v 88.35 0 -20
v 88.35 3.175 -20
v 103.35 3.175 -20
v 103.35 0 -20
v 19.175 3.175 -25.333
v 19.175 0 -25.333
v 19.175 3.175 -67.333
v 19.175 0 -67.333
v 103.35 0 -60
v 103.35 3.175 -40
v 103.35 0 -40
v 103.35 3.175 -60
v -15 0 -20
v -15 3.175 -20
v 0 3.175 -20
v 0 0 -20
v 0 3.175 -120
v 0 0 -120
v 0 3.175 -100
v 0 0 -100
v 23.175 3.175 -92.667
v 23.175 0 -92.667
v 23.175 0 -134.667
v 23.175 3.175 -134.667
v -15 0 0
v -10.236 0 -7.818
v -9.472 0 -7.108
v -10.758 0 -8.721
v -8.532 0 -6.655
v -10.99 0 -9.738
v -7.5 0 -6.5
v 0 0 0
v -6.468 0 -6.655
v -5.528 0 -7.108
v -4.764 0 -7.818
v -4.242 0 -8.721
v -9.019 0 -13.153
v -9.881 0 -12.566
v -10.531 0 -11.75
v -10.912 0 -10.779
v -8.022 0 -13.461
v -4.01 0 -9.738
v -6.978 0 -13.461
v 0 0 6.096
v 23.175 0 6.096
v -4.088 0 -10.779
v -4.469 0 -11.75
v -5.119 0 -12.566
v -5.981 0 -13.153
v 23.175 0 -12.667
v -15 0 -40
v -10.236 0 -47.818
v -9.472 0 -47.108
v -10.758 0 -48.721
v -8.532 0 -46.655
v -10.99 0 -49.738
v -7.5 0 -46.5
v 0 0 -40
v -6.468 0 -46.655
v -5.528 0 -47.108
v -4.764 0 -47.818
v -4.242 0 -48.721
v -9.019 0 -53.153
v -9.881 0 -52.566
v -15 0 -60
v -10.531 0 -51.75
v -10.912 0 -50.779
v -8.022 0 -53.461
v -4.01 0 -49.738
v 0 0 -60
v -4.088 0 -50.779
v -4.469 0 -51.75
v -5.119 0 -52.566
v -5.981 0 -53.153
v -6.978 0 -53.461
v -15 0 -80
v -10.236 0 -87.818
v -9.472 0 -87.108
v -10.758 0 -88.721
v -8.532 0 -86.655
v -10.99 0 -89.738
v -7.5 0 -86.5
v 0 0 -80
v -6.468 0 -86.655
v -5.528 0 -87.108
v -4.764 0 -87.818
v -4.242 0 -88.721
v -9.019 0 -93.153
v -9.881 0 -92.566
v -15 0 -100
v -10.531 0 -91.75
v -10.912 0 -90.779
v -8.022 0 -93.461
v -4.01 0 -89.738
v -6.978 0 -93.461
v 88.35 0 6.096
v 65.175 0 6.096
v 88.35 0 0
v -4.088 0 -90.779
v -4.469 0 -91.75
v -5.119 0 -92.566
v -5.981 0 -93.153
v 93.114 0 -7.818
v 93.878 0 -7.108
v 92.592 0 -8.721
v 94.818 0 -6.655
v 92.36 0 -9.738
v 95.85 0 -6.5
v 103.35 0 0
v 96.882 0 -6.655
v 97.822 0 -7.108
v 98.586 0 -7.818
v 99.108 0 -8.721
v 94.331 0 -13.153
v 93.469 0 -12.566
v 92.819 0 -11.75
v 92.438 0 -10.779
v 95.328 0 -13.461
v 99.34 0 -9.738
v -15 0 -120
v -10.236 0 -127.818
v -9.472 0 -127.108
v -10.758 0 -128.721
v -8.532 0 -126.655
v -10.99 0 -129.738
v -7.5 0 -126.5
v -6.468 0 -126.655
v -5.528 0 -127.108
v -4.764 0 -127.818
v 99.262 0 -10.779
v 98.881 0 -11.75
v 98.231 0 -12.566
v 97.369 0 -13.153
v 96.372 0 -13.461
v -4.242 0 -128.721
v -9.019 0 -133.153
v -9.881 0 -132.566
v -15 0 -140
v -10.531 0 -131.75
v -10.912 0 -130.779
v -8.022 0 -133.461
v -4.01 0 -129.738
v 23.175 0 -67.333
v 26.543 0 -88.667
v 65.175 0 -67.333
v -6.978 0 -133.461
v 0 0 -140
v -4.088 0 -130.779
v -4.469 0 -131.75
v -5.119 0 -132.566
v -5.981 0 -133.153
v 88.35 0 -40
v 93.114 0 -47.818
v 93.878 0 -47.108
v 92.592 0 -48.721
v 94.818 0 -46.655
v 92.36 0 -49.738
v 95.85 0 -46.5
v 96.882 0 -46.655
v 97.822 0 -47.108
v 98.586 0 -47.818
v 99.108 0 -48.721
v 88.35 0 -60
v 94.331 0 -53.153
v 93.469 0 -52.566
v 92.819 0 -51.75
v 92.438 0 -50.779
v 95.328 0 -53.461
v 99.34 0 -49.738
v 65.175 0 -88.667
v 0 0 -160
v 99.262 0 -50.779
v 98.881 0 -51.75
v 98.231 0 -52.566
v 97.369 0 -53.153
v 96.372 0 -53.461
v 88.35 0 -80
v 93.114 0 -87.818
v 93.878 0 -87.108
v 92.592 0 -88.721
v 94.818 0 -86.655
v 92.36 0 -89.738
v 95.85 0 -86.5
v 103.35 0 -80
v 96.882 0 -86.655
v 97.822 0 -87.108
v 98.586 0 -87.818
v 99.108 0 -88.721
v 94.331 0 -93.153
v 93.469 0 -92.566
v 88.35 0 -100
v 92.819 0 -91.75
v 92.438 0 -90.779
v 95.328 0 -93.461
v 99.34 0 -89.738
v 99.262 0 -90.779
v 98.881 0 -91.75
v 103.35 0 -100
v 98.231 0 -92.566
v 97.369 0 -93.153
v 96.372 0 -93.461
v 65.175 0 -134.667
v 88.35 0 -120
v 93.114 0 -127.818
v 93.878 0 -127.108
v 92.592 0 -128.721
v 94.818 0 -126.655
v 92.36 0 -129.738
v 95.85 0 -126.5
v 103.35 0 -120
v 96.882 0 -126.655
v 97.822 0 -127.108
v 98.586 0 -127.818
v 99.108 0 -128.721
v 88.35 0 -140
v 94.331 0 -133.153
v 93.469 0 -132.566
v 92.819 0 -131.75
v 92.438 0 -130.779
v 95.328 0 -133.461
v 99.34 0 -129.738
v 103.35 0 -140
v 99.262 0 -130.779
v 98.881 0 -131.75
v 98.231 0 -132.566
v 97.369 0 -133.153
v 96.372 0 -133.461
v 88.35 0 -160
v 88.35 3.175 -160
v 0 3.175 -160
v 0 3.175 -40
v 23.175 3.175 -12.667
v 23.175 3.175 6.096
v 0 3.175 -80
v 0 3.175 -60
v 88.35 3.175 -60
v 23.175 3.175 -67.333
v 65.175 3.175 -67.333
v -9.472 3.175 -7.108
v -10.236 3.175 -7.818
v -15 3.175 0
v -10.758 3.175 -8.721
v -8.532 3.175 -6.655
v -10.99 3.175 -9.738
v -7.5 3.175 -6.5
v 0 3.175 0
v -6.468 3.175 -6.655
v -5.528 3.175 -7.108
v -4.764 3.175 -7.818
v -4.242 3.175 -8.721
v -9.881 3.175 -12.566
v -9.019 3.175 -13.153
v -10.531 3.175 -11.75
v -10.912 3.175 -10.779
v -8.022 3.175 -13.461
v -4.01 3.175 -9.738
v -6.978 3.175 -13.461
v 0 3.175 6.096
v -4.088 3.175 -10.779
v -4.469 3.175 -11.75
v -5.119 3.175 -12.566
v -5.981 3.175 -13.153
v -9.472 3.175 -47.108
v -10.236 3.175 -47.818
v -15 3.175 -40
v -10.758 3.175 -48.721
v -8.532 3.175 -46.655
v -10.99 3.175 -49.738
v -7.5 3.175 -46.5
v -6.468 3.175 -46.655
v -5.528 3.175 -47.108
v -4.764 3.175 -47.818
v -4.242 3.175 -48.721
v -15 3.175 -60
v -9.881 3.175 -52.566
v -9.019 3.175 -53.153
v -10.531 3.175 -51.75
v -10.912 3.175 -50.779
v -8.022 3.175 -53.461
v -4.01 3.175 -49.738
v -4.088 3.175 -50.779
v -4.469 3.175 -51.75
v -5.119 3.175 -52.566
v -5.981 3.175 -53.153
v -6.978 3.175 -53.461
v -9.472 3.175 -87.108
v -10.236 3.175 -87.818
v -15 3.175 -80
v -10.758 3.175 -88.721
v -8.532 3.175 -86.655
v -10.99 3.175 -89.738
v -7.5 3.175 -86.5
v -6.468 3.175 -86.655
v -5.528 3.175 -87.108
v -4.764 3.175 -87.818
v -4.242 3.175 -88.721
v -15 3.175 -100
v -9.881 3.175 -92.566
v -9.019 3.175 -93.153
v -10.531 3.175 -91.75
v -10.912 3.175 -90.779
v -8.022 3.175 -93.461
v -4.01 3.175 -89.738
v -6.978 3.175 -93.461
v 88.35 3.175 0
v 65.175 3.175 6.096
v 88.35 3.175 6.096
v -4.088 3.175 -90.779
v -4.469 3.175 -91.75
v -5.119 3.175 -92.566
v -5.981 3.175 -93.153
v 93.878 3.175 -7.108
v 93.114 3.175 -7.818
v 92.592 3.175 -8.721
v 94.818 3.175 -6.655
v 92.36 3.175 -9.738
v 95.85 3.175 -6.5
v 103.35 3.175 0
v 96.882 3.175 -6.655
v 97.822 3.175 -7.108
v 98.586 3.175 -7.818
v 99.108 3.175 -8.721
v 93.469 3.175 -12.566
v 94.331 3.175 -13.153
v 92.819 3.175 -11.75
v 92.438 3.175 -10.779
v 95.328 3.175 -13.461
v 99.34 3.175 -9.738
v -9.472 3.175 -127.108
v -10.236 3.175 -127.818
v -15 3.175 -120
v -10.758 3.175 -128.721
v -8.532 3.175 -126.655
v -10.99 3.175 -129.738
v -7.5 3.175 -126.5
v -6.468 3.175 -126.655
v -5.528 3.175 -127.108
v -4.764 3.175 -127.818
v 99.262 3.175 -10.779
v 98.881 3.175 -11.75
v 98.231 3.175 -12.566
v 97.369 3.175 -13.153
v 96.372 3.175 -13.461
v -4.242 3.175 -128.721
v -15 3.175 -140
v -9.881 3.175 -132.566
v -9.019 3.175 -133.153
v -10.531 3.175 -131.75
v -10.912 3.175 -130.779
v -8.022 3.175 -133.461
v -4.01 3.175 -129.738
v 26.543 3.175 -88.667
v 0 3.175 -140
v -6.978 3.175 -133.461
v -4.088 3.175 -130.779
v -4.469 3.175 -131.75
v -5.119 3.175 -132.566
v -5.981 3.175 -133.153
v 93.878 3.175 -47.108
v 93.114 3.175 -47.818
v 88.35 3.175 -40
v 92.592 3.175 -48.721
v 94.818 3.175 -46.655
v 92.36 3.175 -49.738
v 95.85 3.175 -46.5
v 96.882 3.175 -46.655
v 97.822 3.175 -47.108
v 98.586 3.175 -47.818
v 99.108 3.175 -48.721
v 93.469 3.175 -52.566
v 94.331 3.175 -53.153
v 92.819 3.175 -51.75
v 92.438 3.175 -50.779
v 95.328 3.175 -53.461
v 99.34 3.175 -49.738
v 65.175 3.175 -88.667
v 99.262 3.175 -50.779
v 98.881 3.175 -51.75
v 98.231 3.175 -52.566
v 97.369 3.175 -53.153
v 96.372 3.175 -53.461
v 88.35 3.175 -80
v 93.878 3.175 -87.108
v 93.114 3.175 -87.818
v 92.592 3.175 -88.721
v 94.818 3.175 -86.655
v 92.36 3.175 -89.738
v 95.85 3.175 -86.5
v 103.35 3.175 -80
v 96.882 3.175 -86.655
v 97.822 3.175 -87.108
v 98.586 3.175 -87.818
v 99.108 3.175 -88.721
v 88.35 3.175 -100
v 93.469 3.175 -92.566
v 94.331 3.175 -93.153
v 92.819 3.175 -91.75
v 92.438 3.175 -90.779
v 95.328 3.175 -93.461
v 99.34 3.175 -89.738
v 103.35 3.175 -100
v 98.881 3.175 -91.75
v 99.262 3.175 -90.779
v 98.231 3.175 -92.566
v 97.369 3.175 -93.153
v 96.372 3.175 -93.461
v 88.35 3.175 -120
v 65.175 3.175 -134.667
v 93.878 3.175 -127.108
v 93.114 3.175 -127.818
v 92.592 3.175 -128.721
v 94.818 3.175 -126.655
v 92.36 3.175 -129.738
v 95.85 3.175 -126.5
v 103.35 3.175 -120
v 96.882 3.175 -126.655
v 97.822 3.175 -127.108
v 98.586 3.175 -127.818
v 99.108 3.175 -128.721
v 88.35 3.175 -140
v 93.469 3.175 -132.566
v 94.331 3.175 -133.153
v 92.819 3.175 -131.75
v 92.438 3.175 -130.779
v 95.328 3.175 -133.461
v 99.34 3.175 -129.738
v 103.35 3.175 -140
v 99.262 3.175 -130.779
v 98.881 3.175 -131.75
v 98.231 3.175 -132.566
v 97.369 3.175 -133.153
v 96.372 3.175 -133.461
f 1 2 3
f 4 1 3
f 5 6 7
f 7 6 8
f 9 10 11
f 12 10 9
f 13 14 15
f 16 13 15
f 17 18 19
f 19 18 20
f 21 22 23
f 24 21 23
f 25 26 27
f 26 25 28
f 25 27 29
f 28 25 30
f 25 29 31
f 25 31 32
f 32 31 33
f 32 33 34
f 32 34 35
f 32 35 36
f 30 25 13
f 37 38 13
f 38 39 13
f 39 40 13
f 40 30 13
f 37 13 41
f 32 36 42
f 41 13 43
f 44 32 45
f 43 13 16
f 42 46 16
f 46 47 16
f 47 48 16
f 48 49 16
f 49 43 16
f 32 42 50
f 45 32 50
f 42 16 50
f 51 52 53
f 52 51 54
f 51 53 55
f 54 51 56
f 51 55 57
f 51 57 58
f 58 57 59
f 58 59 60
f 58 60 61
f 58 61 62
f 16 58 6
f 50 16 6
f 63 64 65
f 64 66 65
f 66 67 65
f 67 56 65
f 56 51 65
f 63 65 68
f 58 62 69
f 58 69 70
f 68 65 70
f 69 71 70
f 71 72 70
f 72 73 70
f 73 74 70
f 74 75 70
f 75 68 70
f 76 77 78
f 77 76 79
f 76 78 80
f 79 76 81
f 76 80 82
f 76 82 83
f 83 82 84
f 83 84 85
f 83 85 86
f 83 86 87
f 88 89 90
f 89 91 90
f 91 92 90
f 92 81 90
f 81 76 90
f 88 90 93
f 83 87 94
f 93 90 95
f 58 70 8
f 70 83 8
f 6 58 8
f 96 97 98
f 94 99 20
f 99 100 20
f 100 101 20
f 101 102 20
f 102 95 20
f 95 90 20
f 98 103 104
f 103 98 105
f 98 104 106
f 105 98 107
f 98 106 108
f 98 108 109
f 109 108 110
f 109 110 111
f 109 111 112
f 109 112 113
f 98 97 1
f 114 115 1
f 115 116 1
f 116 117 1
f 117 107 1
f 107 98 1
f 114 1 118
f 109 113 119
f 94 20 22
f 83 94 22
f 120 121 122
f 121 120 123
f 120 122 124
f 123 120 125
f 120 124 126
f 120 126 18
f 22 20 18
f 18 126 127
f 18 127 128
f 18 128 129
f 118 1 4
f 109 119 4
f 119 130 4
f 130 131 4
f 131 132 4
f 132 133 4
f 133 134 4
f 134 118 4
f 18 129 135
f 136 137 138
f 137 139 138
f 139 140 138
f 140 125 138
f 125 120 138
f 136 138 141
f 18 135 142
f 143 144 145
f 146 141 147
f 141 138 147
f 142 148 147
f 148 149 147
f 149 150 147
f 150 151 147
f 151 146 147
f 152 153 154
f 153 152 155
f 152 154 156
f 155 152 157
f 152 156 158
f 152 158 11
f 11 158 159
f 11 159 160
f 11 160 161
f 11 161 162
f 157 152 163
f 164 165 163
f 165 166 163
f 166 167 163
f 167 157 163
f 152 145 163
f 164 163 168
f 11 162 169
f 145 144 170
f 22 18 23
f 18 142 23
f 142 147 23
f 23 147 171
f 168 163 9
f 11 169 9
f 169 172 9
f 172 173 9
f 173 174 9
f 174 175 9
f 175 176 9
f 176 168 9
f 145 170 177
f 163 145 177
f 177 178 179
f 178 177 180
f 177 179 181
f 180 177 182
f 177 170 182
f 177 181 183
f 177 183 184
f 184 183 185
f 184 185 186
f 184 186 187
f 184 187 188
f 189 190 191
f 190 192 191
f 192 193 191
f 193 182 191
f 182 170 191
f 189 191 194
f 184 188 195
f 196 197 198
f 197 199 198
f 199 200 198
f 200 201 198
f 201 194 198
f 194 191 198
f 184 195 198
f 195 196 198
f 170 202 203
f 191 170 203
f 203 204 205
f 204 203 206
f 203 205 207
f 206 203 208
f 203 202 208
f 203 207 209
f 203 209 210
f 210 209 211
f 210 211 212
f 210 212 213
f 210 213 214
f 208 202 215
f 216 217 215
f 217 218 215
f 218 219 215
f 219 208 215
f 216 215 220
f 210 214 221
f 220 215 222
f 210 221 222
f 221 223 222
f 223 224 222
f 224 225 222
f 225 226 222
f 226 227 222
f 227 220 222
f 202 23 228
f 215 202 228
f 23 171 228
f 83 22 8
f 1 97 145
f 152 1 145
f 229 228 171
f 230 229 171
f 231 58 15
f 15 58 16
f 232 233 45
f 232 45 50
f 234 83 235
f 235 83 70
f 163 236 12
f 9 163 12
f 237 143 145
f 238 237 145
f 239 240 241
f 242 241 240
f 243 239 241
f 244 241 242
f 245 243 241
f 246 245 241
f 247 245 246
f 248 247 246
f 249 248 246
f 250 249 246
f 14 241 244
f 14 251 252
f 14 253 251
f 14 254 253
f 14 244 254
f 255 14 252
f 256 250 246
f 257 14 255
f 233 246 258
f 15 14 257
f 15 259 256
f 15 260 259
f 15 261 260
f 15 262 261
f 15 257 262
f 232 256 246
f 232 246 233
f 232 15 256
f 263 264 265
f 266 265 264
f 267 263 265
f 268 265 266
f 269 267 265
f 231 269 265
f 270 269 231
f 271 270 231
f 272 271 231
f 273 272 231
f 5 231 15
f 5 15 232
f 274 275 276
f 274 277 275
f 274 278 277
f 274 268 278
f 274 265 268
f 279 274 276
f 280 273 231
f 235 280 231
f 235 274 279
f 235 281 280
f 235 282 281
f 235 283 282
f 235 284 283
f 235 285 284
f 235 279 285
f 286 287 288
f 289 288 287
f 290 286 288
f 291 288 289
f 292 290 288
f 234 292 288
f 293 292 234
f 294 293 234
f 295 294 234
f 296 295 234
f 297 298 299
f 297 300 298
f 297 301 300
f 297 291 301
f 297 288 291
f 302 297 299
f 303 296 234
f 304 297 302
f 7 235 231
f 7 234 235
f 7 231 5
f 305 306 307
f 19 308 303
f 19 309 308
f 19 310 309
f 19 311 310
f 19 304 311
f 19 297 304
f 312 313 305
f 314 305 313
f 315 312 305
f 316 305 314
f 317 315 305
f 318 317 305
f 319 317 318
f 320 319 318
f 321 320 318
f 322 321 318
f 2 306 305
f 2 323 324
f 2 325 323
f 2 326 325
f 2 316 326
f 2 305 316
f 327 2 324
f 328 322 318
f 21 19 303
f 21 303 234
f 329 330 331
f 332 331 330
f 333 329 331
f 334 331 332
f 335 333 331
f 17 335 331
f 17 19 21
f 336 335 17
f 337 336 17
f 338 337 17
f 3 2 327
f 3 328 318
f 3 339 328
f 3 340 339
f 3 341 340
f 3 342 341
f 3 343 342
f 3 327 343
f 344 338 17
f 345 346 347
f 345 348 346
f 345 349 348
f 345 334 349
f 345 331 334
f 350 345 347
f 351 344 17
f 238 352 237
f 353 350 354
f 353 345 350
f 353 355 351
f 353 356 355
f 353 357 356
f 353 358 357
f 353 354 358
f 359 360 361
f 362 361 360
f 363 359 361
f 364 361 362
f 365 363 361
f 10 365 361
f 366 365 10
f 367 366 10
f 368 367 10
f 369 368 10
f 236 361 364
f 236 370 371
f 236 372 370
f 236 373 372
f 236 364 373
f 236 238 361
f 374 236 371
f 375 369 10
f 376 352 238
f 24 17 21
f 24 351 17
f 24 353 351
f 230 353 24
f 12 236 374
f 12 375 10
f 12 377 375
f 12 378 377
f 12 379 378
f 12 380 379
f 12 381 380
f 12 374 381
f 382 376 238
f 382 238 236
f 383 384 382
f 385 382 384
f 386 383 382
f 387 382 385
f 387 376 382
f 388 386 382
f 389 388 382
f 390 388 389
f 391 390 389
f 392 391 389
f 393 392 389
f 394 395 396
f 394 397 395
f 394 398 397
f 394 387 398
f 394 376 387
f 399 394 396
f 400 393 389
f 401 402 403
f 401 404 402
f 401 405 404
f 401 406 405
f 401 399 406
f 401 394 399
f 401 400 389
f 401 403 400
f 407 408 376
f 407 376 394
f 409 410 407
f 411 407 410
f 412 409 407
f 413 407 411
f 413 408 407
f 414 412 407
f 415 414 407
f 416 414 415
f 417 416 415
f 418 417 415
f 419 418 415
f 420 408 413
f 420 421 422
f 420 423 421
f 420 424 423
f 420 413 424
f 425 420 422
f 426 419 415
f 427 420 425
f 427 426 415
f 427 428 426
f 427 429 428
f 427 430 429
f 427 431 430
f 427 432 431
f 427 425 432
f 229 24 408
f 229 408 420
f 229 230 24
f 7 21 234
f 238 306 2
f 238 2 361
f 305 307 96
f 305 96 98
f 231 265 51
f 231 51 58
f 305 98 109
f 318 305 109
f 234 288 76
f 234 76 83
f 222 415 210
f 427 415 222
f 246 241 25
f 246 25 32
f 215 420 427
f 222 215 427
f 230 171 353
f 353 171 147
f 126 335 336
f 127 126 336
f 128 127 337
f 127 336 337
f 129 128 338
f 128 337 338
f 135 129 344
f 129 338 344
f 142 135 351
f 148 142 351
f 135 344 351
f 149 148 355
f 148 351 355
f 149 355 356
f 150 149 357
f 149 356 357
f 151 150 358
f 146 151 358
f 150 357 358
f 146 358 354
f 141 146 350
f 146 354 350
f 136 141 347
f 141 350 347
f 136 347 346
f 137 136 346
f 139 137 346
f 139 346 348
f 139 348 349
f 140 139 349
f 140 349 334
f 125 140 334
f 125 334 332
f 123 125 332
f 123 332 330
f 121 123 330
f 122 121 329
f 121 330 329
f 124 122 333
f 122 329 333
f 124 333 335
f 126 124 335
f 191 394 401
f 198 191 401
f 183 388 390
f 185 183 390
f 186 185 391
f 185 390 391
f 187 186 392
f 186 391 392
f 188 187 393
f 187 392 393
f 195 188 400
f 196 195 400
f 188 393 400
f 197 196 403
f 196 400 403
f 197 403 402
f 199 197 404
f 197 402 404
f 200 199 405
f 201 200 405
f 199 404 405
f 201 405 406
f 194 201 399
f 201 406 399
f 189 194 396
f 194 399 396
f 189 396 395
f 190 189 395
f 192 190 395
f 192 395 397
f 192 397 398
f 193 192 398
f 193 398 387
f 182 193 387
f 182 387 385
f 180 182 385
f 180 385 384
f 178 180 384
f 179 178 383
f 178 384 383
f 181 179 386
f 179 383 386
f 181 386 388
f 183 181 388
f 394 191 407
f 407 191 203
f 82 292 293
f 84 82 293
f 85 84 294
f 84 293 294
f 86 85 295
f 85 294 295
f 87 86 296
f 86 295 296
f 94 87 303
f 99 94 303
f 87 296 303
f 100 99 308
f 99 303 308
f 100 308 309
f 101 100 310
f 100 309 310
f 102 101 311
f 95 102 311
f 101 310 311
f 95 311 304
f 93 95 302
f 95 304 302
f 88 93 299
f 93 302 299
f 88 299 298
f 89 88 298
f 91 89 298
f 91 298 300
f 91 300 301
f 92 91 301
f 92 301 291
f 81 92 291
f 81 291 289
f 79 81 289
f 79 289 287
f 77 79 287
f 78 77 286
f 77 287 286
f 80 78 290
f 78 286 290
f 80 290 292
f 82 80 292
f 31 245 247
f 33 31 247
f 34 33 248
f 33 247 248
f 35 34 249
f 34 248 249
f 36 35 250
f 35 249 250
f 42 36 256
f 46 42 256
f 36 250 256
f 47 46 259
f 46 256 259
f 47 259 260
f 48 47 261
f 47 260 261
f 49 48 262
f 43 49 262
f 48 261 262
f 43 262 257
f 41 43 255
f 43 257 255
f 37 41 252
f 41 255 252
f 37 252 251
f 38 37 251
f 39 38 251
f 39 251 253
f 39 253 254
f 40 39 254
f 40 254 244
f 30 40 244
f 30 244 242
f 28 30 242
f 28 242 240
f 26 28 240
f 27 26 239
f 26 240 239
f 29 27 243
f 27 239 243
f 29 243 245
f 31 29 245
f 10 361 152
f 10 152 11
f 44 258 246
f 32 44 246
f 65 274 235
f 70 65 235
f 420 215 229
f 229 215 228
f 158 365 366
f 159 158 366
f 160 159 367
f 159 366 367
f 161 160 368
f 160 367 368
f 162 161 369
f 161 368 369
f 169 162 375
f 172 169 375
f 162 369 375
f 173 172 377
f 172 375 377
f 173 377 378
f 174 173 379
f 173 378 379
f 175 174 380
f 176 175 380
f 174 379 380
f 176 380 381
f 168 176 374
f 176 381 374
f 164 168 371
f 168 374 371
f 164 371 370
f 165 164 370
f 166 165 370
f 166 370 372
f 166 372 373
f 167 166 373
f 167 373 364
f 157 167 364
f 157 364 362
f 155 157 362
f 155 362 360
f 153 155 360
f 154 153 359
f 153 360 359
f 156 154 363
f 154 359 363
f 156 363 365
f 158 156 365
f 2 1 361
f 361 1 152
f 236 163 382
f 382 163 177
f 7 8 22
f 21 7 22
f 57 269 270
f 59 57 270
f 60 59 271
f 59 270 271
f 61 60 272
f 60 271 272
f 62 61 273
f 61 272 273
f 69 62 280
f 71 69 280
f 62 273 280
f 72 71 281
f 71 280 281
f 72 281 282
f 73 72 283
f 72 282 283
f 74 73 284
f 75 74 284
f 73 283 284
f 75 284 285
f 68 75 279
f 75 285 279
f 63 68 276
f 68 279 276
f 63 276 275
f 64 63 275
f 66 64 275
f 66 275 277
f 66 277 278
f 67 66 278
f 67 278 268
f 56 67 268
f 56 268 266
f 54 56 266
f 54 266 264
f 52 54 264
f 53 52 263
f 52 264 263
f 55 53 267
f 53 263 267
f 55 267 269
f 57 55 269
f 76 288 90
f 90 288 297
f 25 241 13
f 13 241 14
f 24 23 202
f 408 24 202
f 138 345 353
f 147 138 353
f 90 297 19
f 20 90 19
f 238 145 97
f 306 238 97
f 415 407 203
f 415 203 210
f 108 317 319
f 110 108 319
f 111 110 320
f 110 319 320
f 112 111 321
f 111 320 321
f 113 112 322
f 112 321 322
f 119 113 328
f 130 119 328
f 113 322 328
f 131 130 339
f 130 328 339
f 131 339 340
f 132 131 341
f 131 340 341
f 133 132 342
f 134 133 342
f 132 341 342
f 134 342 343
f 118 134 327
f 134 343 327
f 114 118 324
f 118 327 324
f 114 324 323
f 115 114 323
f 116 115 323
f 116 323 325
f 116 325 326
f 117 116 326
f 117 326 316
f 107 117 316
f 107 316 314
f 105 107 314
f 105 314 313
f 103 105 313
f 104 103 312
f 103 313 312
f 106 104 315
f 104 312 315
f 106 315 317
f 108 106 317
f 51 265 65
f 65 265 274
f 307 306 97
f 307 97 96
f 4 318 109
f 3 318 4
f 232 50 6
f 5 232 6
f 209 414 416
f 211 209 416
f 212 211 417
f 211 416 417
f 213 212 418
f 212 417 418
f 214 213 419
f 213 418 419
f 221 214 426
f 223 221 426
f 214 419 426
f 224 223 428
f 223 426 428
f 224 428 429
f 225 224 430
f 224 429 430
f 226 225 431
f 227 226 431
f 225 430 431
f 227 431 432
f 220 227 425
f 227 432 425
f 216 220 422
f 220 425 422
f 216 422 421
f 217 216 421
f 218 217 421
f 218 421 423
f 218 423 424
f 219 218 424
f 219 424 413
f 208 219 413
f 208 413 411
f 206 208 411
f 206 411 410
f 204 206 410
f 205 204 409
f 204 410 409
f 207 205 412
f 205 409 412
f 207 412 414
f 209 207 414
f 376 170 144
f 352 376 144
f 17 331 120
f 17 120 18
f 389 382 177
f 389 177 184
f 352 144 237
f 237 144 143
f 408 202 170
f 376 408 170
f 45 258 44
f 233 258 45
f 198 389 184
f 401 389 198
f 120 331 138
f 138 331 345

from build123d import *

# Parameters (mm, degrees)
BOSS_EXTRUDE1_DEPTH = 3.175
SKETCH3_W           = 15
SKETCH3_H           = 20
SKETCH3_R           = 3.5
BOSS_EXTRUDE3_DEPTH = 3.175
SKETCH4_W           = 23.175
SKETCH4_H           = 6.096
BOSS_EXTRUDE4_DEPTH = 3.175


with BuildPart() as part:
    # Sketch1 → Boss-Extrude1 (new body)
    with BuildSketch(Plane(origin=(0, 0, 0), x_dir=(1, 0, 0), z_dir=(0, 1, 0))):
        Polygon((0, 160), (0, 0), (23.175, 0), (23.175, 12.666666667), (19.175, 25.333333333), (19.175, 67.333333333), (23.175, 92.666666667), (23.175, 134.666666667), (65.175, 134.666666667), (65.175, 92.666666667), (65.175, 88.666666667), (26.543421053, 88.666666667), (23.175, 67.333333333), (65.175, 67.333333333), (65.175, 25.333333333), (65.175, 0), (88.35, 0), (88.35, 160), align=None)
    extrude(amount=BOSS_EXTRUDE1_DEPTH)

    # Sketch3 → Boss-Extrude3 (add)
    # profile 1 of 8: a face of its own
    with BuildSketch(Plane(origin=(0, 3.175, 0), x_dir=(1, 0, 0), z_dir=(0, 1, 0))):
        with Locations((-7.5, 130)):
            Rectangle(SKETCH3_W, SKETCH3_H)
        with Locations(Location((-7.5, 130, 0), (0, 0, 270))):
            Circle(SKETCH3_R, mode=Mode.SUBTRACT)
    # profile 2 of 8: a face of its own
    with BuildSketch(Plane(origin=(0, 3.175, 0), x_dir=(1, 0, 0), z_dir=(0, 1, 0))):
        with Locations((-7.5, 90)):
            Rectangle(SKETCH3_W, SKETCH3_H)
        with Locations(Location((-7.5, 90, 0), (0, 0, 270))):
            Circle(SKETCH3_R, mode=Mode.SUBTRACT)
    # profile 3 of 8: a face of its own
    with BuildSketch(Plane(origin=(0, 3.175, 0), x_dir=(1, 0, 0), z_dir=(0, 1, 0))):
        with Locations((-7.5, 50)):
            Rectangle(SKETCH3_W, SKETCH3_H)
        with Locations(Location((-7.5, 50, 0), (0, 0, 270))):
            Circle(SKETCH3_R, mode=Mode.SUBTRACT)
    # profile 4 of 8: a face of its own
    with BuildSketch(Plane(origin=(0, 3.175, 0), x_dir=(1, 0, 0), z_dir=(0, 1, 0))):
        with Locations((-7.5, 10)):
            Rectangle(SKETCH3_W, SKETCH3_H)
        with Locations(Location((-7.5, 10, 0), (0, 0, 270))):
            Circle(SKETCH3_R, mode=Mode.SUBTRACT)
    # profile 5 of 8: a face of its own
    with BuildSketch(Plane(origin=(0, 3.175, 0), x_dir=(1, 0, 0), z_dir=(0, 1, 0))):
        with Locations((95.85, 10)):
            Rectangle(SKETCH3_W, SKETCH3_H)
        with Locations(Location((95.85, 10, 0), (0, 0, 270))):
            Circle(SKETCH3_R, mode=Mode.SUBTRACT)
    # profile 6 of 8: a face of its own
    with BuildSketch(Plane(origin=(0, 3.175, 0), x_dir=(1, 0, 0), z_dir=(0, 1, 0))):
        with Locations((95.85, 50)):
            Rectangle(SKETCH3_W, SKETCH3_H)
        with Locations(Location((95.85, 50, 0), (0, 0, 270))):
            Circle(SKETCH3_R, mode=Mode.SUBTRACT)
    # profile 7 of 8: a face of its own
    with BuildSketch(Plane(origin=(0, 3.175, 0), x_dir=(1, 0, 0), z_dir=(0, 1, 0))):
        with Locations((95.85, 90)):
            Rectangle(SKETCH3_W, SKETCH3_H)
        with Locations(Location((95.85, 90, 0), (0, 0, 270))):
            Circle(SKETCH3_R, mode=Mode.SUBTRACT)
    # profile 8 of 8: a face of its own
    with BuildSketch(Plane(origin=(0, 3.175, 0), x_dir=(1, 0, 0), z_dir=(0, 1, 0))):
        with Locations((95.85, 130)):
            Rectangle(SKETCH3_W, SKETCH3_H)
        with Locations(Location((95.85, 130, 0), (0, 0, 270))):
            Circle(SKETCH3_R, mode=Mode.SUBTRACT)
    extrude(amount=-BOSS_EXTRUDE3_DEPTH)

    # Sketch4 → Boss-Extrude4 (add)
    with BuildSketch(Plane(origin=(0, 3.175, 0), x_dir=(1, 0, 0), z_dir=(0, 1, 0))):
        with Locations((11.5875, -3.048)):
            Rectangle(SKETCH4_W, SKETCH4_H)
        with Locations((76.7625, -3.048)):
            Rectangle(SKETCH4_W, SKETCH4_H)
    extrude(amount=-BOSS_EXTRUDE4_DEPTH)


solid = part.part
